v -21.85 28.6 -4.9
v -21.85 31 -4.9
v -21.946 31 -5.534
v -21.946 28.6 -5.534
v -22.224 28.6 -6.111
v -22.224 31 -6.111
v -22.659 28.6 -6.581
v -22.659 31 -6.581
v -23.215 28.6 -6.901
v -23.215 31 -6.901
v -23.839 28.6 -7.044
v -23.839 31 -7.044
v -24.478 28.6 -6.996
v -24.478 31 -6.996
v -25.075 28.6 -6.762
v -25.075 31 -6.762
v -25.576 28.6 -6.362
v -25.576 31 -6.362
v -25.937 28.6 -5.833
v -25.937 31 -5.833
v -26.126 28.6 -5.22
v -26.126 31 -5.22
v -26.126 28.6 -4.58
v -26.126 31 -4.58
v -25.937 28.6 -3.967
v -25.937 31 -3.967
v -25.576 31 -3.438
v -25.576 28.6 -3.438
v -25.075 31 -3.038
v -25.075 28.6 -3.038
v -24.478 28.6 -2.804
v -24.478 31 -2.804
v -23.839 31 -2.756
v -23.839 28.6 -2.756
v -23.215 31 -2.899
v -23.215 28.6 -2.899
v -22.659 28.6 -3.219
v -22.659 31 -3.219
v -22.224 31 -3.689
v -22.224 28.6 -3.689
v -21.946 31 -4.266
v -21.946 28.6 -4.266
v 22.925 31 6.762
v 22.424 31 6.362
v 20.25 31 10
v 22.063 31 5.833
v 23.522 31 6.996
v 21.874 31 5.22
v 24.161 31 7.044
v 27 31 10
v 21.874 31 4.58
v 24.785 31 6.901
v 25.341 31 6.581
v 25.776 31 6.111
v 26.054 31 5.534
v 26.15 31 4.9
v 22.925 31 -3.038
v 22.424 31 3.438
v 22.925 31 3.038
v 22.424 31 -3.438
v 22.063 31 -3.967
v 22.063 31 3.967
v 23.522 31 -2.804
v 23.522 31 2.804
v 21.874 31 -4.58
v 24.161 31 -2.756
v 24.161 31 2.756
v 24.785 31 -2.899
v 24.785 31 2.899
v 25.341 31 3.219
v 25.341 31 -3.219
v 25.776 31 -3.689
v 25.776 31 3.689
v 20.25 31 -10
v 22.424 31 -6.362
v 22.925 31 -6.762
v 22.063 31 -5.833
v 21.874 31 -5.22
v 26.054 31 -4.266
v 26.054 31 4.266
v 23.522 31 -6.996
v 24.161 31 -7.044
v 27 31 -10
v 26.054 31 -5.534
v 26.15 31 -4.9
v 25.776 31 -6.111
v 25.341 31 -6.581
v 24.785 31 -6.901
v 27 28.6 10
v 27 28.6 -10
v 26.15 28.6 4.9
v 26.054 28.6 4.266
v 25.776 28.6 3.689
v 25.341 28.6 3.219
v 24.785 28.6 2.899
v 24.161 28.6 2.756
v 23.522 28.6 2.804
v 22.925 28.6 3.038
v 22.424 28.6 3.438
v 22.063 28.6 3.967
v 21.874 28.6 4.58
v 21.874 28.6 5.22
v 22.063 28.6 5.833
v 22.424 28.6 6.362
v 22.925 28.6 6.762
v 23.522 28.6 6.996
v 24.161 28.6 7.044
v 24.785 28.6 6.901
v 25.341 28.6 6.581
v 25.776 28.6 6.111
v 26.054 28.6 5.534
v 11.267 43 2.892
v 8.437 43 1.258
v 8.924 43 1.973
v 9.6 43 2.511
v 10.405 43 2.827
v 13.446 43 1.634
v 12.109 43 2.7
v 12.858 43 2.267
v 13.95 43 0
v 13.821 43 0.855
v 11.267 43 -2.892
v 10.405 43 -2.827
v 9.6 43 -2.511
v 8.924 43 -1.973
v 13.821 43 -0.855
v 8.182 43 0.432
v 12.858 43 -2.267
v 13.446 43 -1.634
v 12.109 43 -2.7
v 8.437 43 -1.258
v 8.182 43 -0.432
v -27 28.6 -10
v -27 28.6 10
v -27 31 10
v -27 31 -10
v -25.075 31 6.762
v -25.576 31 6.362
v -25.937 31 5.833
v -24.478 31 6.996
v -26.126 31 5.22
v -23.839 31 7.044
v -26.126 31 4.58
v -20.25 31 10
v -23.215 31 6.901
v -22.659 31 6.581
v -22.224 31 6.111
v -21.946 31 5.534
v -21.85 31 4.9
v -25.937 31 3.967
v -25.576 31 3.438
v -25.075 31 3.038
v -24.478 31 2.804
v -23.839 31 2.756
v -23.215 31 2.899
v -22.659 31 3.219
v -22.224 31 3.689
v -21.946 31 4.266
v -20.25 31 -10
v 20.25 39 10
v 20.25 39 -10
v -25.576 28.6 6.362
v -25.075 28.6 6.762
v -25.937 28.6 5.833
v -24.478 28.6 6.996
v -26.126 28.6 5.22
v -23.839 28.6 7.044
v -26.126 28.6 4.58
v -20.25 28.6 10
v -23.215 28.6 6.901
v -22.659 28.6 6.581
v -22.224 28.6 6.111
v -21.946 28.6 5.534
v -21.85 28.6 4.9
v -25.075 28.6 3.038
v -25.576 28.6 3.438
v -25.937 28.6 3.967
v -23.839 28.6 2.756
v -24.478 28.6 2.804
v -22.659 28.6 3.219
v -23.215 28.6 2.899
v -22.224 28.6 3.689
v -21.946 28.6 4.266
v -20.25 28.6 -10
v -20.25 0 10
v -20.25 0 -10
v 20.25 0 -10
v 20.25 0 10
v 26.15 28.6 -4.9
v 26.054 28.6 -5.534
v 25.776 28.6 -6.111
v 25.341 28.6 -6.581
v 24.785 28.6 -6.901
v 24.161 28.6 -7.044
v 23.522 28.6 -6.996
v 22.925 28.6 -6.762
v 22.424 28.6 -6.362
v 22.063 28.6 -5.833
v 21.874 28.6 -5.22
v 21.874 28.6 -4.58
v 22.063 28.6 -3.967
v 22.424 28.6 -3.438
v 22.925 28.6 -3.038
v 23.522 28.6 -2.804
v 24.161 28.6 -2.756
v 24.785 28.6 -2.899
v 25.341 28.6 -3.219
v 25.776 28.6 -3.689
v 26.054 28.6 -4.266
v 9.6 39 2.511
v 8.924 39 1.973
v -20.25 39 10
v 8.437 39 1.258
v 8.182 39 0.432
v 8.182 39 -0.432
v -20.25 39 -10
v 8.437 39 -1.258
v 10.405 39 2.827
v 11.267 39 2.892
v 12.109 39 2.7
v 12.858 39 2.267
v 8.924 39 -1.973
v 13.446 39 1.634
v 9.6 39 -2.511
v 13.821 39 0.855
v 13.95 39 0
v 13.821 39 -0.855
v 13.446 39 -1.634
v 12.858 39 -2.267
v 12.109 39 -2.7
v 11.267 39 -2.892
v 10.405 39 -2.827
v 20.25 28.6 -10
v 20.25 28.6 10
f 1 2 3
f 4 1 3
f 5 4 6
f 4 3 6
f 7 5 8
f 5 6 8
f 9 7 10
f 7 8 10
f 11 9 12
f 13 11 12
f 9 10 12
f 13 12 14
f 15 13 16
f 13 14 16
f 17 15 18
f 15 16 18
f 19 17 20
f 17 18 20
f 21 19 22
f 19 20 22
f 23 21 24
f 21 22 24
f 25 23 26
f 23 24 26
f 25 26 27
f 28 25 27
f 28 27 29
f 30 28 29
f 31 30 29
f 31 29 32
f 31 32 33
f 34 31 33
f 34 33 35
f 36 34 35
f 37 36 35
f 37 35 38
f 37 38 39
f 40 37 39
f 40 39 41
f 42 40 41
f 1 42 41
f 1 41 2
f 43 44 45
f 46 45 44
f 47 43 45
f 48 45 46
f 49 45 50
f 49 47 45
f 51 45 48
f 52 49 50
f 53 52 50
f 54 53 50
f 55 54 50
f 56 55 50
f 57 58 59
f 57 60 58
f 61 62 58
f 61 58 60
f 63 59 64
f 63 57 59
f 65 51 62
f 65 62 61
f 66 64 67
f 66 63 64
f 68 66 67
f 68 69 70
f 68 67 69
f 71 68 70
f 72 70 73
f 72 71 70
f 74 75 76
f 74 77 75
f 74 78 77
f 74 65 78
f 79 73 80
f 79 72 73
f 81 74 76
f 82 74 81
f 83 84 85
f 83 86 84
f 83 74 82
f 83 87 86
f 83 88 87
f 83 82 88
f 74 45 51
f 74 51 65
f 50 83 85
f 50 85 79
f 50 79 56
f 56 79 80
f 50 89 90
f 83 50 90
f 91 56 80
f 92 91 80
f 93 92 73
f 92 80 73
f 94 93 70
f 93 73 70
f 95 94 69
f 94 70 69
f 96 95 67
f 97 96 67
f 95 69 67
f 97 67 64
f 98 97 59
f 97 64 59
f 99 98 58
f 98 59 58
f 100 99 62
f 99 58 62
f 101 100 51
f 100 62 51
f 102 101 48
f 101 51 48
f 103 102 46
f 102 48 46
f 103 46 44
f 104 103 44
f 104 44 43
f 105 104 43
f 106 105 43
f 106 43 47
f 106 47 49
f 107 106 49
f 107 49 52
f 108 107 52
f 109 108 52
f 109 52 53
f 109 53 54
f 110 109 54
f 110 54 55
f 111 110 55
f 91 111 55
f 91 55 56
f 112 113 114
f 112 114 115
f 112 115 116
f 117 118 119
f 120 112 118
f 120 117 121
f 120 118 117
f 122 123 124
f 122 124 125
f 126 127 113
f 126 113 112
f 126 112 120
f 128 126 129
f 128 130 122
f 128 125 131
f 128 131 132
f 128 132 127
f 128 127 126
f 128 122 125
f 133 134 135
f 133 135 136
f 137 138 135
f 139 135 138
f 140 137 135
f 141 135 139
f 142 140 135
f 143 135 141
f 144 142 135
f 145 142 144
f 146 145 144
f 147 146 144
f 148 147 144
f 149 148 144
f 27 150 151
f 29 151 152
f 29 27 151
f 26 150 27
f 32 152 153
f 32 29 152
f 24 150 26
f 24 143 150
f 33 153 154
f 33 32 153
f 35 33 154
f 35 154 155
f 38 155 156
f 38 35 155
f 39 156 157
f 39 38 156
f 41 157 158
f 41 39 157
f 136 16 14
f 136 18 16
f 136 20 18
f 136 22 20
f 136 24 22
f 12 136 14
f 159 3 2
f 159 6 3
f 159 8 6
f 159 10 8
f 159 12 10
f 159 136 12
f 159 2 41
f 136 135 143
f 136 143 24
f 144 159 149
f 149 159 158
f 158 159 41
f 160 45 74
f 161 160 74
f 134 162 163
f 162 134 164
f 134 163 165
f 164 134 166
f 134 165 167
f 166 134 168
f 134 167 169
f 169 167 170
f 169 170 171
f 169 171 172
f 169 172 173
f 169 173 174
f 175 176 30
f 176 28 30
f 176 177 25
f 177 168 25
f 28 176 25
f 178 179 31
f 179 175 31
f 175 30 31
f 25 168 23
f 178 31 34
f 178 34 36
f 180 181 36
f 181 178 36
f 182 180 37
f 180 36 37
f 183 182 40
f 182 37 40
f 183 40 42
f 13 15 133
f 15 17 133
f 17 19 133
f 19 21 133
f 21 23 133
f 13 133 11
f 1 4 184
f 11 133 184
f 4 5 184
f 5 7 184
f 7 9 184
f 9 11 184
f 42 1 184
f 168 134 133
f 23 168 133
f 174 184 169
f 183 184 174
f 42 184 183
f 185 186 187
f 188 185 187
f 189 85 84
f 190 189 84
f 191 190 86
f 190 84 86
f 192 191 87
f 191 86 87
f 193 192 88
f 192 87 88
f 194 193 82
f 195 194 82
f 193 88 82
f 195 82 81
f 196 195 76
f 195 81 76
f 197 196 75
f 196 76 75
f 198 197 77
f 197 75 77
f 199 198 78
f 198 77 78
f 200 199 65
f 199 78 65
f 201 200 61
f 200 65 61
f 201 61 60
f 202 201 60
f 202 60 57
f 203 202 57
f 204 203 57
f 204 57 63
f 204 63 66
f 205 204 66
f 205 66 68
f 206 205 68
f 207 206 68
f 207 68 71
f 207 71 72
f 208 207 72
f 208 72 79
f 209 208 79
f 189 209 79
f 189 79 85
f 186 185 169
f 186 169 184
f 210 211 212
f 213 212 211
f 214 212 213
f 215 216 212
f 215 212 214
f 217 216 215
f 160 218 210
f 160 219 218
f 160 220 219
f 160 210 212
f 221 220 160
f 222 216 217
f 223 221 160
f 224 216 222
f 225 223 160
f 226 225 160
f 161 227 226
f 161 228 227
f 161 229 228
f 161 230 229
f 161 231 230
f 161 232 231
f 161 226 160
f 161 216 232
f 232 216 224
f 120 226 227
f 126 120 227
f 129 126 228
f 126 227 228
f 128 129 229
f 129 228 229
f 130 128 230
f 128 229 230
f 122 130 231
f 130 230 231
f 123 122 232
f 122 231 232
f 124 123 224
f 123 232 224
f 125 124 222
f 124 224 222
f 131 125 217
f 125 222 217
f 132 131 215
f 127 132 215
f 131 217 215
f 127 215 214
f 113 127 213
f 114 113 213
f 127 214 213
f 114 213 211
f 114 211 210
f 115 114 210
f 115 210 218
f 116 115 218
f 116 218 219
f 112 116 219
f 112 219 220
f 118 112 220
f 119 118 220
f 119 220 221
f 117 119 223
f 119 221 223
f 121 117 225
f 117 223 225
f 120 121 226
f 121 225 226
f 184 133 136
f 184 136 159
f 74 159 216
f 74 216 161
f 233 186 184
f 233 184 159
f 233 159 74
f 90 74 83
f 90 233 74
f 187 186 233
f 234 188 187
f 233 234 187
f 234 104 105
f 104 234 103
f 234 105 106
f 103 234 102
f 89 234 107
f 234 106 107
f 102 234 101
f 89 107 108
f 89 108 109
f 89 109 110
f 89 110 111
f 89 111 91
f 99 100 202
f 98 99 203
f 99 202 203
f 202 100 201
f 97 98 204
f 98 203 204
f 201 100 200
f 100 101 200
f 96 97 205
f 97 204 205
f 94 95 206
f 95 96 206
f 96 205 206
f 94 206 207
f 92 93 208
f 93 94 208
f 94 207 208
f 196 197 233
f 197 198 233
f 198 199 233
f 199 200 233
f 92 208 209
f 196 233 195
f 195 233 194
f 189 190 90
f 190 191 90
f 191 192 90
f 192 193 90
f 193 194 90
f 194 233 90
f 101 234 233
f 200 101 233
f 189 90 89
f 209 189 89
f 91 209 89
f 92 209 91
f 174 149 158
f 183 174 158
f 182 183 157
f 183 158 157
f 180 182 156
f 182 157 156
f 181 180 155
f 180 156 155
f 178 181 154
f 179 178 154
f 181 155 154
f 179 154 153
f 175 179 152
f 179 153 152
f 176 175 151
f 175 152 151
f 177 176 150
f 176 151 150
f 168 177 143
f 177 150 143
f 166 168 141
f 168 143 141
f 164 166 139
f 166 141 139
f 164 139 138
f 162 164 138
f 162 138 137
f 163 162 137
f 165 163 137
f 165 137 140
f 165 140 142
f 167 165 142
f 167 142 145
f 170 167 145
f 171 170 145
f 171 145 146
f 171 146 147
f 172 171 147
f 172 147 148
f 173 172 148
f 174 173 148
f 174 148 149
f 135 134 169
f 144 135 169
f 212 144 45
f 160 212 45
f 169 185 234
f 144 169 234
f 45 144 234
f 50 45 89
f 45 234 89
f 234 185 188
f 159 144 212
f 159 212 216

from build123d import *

# Parameters (mm, degrees)
SKETCH_1_W          = 40.5
SKETCH_1_H          = 20
EXTRUDE_1_DEPTH     = 28.6
SKETCH_2_W          = 54
SKETCH_2_H          = 20
EXTRUDE_2_DEPTH     = 2.4
SKETCH_3_W          = 40.5
SKETCH_3_H          = 20
EXTRUDE_3_DEPTH     = 8
SKETCH_4_R          = 2.9
EXTRUDE_4_DEPTH     = 4
SKETCH_5_R          = 2.15
CUT_EXTRUDE_1_DEPTH = 32


with BuildPart() as part:
    # 草图1 → 凸台-拉伸1 (new body)
    with BuildSketch(Plane(origin=(0, 0, 0), x_dir=(1, 0, 0), z_dir=(0, 1, 0))):
        Rectangle(SKETCH_1_W, SKETCH_1_H)
    extrude(amount=EXTRUDE_1_DEPTH)

    # 草图2 → 凸台-拉伸2 (add)
    with BuildSketch(Plane(origin=(0, 28.6, 0), x_dir=(1, 0, 0), z_dir=(0, 1, 0))):
        Rectangle(SKETCH_2_W, SKETCH_2_H)
    extrude(amount=EXTRUDE_2_DEPTH)

    # 草图3 → 凸台-拉伸3 (add)
    with BuildSketch(Plane(origin=(0, 31, 0), x_dir=(1, 0, 0), z_dir=(0, 1, 0))):
        Rectangle(SKETCH_3_W, SKETCH_3_H)
    extrude(amount=EXTRUDE_3_DEPTH)

    # 草图4 → 凸台-拉伸4 (add)
    with BuildSketch(Plane(origin=(0, 39, 0), x_dir=(1, 0, 0), z_dir=(0, 1, 0))):
        with Locations((11.05, 0)):
            Circle(SKETCH_4_R)
    extrude(amount=EXTRUDE_4_DEPTH)

    # 草图5 → 切除-拉伸1 (cut, through all)
    with BuildSketch(Plane(origin=(0, 31, 0), x_dir=(1, 0, 0), z_dir=(0, 1, 0))):
        with Locations((24, 4.9)):
            Circle(SKETCH_5_R)
        with Locations((24, -4.9)):
            Circle(SKETCH_5_R)
        with Locations((-24, -4.9)):
            Circle(SKETCH_5_R)
        with Locations((-24, 4.9)):
            Circle(SKETCH_5_R)
    extrude(amount=-CUT_EXTRUDE_1_DEPTH, mode=Mode.SUBTRACT)


solid = part.part
